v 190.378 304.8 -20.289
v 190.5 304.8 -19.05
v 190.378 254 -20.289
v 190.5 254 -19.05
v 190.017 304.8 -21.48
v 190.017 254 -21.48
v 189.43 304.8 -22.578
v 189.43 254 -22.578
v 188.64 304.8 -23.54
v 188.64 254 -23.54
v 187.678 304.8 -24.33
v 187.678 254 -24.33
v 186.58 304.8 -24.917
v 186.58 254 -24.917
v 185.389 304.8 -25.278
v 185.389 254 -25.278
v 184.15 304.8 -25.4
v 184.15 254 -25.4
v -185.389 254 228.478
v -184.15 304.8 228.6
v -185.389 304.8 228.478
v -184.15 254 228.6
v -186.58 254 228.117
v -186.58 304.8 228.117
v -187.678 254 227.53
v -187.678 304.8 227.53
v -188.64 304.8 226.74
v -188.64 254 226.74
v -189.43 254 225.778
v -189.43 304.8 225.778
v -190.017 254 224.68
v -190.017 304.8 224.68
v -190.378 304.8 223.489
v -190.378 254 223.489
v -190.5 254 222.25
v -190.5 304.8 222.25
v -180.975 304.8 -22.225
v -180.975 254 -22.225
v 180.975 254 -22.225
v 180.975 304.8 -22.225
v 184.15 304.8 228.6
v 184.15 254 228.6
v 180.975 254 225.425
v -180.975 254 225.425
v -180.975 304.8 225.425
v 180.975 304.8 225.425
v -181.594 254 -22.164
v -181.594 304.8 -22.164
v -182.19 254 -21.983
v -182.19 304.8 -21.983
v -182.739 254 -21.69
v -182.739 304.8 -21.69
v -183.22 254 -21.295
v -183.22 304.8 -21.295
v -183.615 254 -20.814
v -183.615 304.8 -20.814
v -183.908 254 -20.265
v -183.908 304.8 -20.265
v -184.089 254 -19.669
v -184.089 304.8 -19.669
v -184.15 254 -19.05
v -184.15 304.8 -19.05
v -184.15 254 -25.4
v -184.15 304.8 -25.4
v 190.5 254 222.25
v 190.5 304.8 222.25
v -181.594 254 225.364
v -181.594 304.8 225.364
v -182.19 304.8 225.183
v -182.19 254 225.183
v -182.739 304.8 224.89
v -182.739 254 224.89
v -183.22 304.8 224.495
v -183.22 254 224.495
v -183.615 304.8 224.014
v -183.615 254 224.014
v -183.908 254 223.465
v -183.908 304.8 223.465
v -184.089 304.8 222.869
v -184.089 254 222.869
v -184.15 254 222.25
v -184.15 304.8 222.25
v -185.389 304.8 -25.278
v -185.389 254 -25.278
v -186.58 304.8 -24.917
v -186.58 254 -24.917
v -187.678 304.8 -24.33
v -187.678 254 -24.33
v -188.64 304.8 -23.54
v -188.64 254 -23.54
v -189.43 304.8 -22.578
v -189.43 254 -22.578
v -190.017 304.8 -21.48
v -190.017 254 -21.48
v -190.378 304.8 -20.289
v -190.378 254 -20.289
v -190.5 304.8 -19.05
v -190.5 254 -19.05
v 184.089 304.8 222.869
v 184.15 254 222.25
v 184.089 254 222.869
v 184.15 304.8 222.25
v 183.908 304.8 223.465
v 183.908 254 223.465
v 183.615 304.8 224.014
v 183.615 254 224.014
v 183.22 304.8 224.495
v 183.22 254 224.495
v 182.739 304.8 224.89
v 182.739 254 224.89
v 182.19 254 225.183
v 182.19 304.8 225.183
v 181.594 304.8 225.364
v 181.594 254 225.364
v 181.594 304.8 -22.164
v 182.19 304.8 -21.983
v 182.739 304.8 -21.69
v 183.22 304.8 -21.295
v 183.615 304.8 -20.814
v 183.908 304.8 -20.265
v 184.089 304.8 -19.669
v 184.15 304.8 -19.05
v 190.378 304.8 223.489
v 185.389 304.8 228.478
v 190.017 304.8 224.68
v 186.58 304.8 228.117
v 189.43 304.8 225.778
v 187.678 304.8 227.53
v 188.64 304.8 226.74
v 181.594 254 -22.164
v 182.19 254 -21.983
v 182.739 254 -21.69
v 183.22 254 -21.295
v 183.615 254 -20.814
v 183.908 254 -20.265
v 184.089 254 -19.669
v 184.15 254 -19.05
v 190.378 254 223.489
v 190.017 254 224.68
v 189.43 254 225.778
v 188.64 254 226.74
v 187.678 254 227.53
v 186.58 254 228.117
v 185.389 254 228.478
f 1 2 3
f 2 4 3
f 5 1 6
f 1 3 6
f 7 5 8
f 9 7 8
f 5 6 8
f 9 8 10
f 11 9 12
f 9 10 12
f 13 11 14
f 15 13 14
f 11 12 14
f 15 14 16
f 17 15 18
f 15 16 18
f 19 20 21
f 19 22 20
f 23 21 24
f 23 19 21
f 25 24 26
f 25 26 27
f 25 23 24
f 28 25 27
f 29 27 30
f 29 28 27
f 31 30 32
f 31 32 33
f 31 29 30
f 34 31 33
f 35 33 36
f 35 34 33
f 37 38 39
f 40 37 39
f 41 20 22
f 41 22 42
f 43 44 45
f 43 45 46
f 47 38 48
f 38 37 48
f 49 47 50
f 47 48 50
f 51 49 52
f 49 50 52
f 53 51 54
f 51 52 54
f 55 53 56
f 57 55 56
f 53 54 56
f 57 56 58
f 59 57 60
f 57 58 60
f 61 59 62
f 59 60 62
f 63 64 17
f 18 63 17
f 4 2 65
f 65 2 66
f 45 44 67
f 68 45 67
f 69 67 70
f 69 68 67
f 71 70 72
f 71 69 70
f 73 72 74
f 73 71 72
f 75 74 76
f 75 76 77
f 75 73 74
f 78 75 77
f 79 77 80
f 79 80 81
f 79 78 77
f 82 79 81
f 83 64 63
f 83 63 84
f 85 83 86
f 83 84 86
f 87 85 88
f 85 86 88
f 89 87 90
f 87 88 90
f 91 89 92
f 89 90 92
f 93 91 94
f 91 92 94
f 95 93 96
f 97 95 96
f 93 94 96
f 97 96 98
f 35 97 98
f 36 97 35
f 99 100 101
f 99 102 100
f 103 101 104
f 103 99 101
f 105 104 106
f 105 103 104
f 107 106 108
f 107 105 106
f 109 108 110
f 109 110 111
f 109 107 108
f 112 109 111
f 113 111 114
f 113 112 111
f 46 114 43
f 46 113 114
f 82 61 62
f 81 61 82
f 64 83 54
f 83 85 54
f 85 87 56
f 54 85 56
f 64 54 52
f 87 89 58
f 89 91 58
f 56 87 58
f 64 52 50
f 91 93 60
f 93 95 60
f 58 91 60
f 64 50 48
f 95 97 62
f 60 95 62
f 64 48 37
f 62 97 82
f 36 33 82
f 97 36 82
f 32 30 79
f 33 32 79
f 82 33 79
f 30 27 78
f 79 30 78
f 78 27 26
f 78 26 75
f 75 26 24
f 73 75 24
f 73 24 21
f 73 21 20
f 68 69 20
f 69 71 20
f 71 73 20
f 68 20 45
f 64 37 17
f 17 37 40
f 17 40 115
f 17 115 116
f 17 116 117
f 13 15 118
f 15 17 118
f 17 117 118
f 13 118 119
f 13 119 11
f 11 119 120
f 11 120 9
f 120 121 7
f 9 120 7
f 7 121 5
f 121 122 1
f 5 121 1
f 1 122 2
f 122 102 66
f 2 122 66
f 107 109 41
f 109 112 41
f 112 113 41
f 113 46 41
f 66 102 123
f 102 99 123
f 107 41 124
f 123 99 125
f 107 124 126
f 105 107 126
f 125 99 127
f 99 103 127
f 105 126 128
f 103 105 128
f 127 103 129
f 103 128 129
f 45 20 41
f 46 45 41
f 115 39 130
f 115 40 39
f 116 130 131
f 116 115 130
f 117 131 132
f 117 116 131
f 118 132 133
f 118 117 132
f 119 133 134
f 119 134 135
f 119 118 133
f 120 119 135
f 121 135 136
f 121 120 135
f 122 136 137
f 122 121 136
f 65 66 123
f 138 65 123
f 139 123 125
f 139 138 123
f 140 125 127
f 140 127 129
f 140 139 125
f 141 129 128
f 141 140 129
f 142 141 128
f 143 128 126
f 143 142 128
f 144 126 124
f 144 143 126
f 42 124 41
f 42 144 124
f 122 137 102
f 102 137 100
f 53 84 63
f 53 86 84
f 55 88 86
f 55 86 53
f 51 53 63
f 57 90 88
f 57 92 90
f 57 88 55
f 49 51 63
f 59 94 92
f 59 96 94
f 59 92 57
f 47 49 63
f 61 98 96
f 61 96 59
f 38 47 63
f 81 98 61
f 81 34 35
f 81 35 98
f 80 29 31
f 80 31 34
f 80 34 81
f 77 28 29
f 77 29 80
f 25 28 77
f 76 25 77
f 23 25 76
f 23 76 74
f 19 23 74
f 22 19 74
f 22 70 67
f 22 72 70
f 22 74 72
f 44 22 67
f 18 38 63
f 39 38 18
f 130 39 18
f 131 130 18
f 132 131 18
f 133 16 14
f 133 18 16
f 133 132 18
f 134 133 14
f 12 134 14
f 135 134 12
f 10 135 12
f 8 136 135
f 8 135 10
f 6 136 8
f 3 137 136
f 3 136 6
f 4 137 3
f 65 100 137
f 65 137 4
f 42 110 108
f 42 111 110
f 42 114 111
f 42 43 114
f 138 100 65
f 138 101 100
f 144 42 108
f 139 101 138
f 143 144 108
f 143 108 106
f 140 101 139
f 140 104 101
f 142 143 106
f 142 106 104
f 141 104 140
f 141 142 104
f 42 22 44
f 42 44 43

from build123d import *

# Parameters (mm, degrees)
F0_W     = 381
F0_H     = 254
F1_DEPTH = 50.8
F2_R     = 6.35
F3_R     = 6.35
F5_W     = 368.3
F5_H     = 247.65
F6_DEPTH = 50.8
F7_R     = 3.175


with BuildPart() as f1:
    # F0 (on Front) → F1 (new body)
    with BuildSketch(Plane.XZ):
        Rectangle(F0_W, F0_H)
    extrude(amount=F1_DEPTH)

    # F2
    f2_edges = [f1.edges().sort_by_distance(p)[0] for p in [
        (190.5, -25.4, 127),
    ]]
    fillet(f2_edges, radius=F2_R)

    # F3
    f3_edges = [f1.edges().sort_by_distance(p)[0] for p in [
        (190.5, -25.4, -127),
        (-190.5, -25.4, 127),
        (-190.5, -25.4, -127),
    ]]
    fillet(f3_edges, radius=F3_R)


with BuildPart() as f1_1:
    # F4: moved
    add(f1.part.moved(Location((0, 50.8, 0))))

    # F5 (on Front) → F6 (cut)
    with BuildSketch(Plane.XZ):
        Rectangle(F5_W, F5_H)
    extrude(amount=-F6_DEPTH, mode=Mode.SUBTRACT)

    # F7
    f7_edges = [f1_1.edges().sort_by_distance(p)[0] for p in [
        (184.15, 25.4, -123.825),
        (184.15, 25.4, 123.825),
        (-184.15, 25.4, 123.825),
        (-184.15, 25.4, -123.825),
    ]]
    fillet(f7_edges, radius=F7_R)


with BuildPart() as f1_2:
    # F8: moved
    add(f1_1.part.moved(Location((0, 50.8, 0))))


with BuildPart() as f1_3:
    # F9: moved
    add(f1_2.part.moved(Location((0, 0, -101.6))))


with BuildPart() as f1_4:
    # F10: moved
    add(f1_3.part.moved(Location((0, 203.2, 0))))


with BuildPart() as f1_5:
    # F11: moved
    add(f1_4.part.moved(Location((0, 0, 203.2))))


solid = f1_5.part
